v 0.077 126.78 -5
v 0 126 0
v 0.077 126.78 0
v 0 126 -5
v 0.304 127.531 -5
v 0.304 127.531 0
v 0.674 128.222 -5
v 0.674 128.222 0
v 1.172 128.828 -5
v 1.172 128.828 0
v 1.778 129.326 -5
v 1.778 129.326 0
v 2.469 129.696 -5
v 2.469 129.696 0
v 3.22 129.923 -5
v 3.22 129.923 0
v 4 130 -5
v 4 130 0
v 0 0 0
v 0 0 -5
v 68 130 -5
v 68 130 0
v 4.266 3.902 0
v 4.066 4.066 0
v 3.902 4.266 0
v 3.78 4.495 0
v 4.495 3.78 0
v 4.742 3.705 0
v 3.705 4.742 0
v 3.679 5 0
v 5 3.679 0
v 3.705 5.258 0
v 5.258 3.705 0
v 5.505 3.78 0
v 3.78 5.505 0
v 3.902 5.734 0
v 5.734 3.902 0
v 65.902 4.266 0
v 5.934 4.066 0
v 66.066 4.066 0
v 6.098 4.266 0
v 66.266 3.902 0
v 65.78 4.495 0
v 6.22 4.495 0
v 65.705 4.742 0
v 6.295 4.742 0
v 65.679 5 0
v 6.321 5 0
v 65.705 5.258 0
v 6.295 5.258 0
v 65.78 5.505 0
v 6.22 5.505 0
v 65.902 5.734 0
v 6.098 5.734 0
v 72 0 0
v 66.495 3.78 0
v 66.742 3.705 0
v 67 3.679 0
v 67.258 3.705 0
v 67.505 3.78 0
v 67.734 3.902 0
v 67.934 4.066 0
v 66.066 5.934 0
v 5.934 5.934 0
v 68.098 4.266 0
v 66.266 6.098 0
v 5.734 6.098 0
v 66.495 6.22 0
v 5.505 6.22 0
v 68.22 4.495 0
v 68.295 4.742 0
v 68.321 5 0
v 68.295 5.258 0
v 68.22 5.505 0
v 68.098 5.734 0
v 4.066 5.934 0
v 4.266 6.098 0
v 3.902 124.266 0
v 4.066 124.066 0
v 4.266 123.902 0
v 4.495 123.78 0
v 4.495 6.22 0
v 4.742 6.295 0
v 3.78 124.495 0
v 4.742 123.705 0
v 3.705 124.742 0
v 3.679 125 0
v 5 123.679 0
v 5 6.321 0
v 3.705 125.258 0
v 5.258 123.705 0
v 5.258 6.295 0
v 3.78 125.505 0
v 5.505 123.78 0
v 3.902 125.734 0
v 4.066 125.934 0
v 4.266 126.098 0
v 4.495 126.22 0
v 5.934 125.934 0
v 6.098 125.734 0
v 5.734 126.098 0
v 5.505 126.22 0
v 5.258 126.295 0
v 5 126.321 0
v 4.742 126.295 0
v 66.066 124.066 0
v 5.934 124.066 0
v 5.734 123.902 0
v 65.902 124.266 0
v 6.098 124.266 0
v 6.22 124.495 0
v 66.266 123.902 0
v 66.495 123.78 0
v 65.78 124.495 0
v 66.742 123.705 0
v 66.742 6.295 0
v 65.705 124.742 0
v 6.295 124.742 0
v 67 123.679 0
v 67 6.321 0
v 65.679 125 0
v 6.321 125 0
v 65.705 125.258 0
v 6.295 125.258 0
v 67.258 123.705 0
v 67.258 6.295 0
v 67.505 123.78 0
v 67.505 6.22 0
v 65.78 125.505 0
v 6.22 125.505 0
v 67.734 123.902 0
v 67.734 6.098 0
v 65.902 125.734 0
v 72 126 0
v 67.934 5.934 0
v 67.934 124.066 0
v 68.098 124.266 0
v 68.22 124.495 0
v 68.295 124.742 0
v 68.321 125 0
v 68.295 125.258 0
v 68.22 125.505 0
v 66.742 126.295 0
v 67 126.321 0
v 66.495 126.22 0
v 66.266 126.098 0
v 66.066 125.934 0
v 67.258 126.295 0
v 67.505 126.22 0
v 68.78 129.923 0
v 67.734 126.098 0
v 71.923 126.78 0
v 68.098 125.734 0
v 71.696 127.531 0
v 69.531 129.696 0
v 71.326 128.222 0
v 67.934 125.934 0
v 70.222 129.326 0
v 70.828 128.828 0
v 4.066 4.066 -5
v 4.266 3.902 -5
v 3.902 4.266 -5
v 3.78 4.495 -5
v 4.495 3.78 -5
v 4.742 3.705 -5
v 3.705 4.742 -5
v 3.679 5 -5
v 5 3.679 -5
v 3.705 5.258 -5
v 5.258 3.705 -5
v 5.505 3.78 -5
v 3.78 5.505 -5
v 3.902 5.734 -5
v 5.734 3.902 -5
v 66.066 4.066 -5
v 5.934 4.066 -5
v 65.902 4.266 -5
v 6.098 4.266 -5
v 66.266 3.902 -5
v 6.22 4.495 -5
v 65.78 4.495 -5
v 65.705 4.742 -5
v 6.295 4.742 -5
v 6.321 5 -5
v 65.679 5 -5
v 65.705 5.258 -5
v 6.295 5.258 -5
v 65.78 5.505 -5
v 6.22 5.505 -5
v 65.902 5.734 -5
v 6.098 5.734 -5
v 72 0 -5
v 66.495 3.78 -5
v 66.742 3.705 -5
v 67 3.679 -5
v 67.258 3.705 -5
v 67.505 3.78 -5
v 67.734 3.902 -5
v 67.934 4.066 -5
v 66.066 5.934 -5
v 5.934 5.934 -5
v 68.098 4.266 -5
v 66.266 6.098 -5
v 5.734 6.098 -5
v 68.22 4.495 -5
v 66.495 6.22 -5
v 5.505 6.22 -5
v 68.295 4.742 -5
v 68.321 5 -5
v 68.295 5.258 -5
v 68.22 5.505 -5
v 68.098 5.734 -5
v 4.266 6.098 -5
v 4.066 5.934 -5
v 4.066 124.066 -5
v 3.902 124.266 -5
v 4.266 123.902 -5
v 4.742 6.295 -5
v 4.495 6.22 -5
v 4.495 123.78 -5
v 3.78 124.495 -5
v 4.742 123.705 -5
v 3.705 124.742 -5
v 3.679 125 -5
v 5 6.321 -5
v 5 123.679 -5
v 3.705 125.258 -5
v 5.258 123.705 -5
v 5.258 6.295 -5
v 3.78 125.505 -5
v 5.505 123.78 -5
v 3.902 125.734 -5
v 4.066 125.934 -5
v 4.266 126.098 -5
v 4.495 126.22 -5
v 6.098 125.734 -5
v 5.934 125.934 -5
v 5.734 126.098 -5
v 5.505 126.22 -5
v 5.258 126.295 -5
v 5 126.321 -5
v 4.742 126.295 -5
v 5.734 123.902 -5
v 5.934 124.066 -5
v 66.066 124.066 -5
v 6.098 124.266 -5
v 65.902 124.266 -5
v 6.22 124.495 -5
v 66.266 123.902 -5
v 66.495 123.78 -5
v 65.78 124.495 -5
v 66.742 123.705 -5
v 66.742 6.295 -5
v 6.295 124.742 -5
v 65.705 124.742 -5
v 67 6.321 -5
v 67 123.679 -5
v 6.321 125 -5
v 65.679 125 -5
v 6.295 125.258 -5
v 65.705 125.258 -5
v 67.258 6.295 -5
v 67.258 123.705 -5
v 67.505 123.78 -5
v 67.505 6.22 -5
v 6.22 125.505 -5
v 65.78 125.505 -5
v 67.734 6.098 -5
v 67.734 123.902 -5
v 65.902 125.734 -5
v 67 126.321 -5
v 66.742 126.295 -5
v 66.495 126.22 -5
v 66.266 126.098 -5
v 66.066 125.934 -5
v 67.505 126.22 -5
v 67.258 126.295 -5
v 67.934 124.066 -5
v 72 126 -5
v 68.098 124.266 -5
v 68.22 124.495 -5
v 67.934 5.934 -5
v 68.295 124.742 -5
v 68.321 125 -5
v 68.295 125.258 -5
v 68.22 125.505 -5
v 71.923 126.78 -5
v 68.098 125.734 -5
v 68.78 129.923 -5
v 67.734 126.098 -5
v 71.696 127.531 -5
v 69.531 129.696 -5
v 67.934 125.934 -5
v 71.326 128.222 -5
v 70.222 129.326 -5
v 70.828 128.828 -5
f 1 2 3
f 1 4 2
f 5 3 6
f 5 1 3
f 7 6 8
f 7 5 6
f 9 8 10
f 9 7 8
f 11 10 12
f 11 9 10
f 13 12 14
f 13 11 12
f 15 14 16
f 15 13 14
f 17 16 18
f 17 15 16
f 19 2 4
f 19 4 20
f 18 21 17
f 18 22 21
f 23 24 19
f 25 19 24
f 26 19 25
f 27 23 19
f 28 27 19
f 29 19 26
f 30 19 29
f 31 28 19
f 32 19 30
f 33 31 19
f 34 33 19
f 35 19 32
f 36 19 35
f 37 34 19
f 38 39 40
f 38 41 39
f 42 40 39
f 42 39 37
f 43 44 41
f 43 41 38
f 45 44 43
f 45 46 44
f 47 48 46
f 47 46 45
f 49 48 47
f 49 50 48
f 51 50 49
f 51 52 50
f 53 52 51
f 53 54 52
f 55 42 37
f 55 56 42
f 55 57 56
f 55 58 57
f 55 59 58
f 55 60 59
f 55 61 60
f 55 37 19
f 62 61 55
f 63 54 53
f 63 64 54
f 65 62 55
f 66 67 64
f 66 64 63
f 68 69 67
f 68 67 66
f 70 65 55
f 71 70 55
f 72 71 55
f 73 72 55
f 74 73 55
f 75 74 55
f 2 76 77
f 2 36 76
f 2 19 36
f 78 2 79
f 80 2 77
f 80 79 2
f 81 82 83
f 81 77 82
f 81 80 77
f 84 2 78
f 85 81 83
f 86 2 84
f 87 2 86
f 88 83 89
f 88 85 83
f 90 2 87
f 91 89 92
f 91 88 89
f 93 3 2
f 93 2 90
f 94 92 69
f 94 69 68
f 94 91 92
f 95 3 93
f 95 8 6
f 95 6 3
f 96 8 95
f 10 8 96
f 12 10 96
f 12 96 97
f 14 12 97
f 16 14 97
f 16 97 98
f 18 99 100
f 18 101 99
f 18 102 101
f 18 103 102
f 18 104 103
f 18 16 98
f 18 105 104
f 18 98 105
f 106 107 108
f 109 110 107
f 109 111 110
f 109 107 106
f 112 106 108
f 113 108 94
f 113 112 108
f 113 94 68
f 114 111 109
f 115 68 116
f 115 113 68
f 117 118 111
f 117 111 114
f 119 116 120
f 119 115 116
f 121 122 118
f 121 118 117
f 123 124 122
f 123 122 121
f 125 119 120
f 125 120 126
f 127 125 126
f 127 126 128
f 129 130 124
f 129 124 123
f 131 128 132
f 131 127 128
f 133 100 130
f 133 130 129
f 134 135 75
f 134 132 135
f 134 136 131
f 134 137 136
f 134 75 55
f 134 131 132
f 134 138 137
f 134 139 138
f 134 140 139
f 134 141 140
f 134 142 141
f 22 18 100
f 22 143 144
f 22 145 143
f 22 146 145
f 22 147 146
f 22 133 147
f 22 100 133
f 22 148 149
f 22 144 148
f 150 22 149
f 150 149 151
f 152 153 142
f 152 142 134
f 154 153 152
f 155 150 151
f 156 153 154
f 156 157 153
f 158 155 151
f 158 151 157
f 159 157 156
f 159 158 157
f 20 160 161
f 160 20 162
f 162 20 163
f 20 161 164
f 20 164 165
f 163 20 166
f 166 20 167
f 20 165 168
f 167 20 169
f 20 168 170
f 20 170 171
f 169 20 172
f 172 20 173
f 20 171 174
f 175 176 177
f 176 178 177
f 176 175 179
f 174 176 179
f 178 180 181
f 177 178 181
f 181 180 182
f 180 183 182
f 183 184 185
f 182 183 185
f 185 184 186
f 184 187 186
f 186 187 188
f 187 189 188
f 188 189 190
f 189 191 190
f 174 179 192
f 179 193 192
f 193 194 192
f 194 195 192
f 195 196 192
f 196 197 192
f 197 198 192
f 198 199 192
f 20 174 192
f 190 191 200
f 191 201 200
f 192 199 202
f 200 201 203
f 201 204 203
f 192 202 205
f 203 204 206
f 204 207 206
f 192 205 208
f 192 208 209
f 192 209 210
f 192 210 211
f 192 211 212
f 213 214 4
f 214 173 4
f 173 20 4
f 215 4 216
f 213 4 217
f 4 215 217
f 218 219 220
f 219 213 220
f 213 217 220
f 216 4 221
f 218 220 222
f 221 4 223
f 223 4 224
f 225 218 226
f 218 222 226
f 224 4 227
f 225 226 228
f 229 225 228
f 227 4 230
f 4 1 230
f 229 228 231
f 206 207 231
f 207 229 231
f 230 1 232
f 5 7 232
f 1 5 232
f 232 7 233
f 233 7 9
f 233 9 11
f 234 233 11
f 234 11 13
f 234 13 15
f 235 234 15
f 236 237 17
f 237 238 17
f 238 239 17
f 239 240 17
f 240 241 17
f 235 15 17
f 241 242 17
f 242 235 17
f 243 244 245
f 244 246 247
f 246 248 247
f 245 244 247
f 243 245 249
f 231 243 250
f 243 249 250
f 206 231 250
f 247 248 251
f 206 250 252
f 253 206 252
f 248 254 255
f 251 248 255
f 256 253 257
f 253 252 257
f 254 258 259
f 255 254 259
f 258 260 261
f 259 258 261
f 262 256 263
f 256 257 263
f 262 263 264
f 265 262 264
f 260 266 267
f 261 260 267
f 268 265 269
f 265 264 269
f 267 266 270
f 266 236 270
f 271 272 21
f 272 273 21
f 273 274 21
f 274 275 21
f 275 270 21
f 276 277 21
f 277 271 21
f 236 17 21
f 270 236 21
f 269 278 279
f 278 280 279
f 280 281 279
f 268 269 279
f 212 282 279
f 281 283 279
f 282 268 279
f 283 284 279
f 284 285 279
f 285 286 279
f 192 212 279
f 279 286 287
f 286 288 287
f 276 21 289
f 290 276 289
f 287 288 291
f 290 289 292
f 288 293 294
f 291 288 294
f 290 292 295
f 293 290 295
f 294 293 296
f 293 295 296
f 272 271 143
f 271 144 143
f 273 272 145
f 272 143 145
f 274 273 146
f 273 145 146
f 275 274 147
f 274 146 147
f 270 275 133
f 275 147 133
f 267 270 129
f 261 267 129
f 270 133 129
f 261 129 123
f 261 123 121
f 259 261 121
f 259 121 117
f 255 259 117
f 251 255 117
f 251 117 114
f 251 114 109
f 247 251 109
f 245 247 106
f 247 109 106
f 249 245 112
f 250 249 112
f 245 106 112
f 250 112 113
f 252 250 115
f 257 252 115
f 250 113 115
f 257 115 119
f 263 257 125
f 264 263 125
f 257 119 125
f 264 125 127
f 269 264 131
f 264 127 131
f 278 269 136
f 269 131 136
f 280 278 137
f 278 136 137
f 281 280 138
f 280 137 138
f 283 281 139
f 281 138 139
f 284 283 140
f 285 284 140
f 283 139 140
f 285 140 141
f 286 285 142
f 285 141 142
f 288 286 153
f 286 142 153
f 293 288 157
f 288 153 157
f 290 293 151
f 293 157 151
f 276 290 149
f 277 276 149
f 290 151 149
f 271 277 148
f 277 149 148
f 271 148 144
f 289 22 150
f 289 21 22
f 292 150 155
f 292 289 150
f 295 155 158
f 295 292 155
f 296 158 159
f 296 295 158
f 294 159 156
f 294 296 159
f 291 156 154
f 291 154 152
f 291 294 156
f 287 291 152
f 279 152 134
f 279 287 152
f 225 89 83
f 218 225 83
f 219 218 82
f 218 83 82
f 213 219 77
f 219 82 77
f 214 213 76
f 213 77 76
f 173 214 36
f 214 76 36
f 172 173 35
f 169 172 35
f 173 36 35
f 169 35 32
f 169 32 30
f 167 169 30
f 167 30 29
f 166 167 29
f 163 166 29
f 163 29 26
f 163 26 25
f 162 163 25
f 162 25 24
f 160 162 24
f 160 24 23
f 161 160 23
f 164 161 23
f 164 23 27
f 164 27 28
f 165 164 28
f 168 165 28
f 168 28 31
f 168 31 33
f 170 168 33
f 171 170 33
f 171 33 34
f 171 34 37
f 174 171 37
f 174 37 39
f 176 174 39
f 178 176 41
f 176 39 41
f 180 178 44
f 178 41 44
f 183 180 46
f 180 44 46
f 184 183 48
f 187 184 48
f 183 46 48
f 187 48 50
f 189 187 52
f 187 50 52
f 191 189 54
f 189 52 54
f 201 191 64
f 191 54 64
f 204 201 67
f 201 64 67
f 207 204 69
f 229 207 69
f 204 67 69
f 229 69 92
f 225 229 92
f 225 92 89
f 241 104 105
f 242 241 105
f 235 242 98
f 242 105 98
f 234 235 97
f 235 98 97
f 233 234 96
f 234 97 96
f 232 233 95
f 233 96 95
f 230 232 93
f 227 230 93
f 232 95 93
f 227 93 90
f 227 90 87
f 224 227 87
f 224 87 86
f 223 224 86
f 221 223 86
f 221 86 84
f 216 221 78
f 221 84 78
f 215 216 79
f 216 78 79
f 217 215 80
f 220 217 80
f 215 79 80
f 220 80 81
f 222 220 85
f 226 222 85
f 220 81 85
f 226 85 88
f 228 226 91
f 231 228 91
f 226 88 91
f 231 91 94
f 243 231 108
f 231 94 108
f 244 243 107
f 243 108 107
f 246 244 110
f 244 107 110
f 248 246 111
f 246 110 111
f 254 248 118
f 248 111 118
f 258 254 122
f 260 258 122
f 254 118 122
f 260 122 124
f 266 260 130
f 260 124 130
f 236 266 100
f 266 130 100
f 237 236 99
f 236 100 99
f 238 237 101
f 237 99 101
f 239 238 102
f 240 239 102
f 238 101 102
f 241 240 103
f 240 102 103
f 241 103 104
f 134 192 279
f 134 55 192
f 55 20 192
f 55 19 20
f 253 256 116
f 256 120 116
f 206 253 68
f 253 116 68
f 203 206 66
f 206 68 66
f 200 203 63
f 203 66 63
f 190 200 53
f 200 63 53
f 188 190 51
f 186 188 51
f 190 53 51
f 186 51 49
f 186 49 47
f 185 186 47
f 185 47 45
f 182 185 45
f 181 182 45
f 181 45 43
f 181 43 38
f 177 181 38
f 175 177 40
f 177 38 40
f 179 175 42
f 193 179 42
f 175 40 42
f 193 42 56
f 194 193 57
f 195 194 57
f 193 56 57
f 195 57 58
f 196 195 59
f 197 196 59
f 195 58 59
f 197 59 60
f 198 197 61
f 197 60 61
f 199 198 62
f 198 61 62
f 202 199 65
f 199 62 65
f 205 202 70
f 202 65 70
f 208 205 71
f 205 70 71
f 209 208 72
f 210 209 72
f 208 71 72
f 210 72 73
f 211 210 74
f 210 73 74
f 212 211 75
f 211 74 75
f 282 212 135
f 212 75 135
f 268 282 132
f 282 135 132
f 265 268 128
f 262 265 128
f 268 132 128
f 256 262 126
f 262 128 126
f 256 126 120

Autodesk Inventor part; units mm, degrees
ref_plane "YZ Plane" through (0, 0, 0) normal (1, 0, 0) x (0, 1, 0)
ref_plane "XZ Plane" through (0, 0, 0) normal (0, 1, 0) x (-1, 0, 0)
ref_plane "XY Plane" through (0, 0, 0) normal (0, 0, 1) x (1, 0, 0)
sketch "Sketch1" plane through (0, 0, 0) normal (0, 0, 1) x (1, 0, 0)
  line L0 (0, 0) -> (72, 0)
  line L1 (72, 0) -> (72, 130)
  line L2 (72, 130) -> (0, 130)
  line L3 (0, 130) -> (0, 0)
  dimension "d0" = 72
  dimension "d1" = 130
extrude "Extrusion1" add sketch "Sketch1" against normal blind 5
fillet "Fillet1" radius 4 1 edges at (72, 130, -2.5)
fillet "Fillet2" radius 4 1 edges at (0, 130, -2.5)
sketch "Sketch2" plane through (0, 0, -5) normal (0, 0, -1) x (-1, 0, 0)
  circle A0 centre (-67, 125) radius 1.5
  line L0 (-72, 126) -> (-72, 0) projected
  line L1 (-4, 130) -> (-68, 130) projected
  line L2 (0, 0) -> (0, 126) projected
  arc A1 (0, 126) -> (-4, 130) centre (-4, 126) ccw projected
  line L3 (-4, 130) -> (-68, 130) projected
  arc A2 (-68, 130) -> (-72, 126) centre (-68, 126) ccw projected
  line L4 (-72, 126) -> (-72, 0) projected
  line L5 (-72, 0) -> (0, 0) projected
  line L6 (0, 0) -> (0, 126) projected
  line L7 (-68, 130) -> (-4, 130) projected
  line L8 (0, 0) -> (-72, 0) projected
  circle A3 centre (-5, 125) radius 1.5
  circle A4 centre (-67, 5) radius 1.5
  line L9 (-36, 130) -> (-36, 0)
  circle A5 centre (-5, 5) radius 1.5
  dimension "d7" = 3
  dimension "d8" = 5
  dimension "d9" = 5
  dimension "d10" = 3
  dimension "d11" = 5
  dimension "d12" = 5
hole "Hole1" at (67, 125, -5) at (5, 125, -5) at (67, 5, -5) at (5, 5, -5) direction (0, 0, 1) diameter 2.6416 depth 10.979 thread size "6-32 UNC" class "2B" standard "ANSI Unified Screw Threads"
properties part number "backdor" material "Steel"
